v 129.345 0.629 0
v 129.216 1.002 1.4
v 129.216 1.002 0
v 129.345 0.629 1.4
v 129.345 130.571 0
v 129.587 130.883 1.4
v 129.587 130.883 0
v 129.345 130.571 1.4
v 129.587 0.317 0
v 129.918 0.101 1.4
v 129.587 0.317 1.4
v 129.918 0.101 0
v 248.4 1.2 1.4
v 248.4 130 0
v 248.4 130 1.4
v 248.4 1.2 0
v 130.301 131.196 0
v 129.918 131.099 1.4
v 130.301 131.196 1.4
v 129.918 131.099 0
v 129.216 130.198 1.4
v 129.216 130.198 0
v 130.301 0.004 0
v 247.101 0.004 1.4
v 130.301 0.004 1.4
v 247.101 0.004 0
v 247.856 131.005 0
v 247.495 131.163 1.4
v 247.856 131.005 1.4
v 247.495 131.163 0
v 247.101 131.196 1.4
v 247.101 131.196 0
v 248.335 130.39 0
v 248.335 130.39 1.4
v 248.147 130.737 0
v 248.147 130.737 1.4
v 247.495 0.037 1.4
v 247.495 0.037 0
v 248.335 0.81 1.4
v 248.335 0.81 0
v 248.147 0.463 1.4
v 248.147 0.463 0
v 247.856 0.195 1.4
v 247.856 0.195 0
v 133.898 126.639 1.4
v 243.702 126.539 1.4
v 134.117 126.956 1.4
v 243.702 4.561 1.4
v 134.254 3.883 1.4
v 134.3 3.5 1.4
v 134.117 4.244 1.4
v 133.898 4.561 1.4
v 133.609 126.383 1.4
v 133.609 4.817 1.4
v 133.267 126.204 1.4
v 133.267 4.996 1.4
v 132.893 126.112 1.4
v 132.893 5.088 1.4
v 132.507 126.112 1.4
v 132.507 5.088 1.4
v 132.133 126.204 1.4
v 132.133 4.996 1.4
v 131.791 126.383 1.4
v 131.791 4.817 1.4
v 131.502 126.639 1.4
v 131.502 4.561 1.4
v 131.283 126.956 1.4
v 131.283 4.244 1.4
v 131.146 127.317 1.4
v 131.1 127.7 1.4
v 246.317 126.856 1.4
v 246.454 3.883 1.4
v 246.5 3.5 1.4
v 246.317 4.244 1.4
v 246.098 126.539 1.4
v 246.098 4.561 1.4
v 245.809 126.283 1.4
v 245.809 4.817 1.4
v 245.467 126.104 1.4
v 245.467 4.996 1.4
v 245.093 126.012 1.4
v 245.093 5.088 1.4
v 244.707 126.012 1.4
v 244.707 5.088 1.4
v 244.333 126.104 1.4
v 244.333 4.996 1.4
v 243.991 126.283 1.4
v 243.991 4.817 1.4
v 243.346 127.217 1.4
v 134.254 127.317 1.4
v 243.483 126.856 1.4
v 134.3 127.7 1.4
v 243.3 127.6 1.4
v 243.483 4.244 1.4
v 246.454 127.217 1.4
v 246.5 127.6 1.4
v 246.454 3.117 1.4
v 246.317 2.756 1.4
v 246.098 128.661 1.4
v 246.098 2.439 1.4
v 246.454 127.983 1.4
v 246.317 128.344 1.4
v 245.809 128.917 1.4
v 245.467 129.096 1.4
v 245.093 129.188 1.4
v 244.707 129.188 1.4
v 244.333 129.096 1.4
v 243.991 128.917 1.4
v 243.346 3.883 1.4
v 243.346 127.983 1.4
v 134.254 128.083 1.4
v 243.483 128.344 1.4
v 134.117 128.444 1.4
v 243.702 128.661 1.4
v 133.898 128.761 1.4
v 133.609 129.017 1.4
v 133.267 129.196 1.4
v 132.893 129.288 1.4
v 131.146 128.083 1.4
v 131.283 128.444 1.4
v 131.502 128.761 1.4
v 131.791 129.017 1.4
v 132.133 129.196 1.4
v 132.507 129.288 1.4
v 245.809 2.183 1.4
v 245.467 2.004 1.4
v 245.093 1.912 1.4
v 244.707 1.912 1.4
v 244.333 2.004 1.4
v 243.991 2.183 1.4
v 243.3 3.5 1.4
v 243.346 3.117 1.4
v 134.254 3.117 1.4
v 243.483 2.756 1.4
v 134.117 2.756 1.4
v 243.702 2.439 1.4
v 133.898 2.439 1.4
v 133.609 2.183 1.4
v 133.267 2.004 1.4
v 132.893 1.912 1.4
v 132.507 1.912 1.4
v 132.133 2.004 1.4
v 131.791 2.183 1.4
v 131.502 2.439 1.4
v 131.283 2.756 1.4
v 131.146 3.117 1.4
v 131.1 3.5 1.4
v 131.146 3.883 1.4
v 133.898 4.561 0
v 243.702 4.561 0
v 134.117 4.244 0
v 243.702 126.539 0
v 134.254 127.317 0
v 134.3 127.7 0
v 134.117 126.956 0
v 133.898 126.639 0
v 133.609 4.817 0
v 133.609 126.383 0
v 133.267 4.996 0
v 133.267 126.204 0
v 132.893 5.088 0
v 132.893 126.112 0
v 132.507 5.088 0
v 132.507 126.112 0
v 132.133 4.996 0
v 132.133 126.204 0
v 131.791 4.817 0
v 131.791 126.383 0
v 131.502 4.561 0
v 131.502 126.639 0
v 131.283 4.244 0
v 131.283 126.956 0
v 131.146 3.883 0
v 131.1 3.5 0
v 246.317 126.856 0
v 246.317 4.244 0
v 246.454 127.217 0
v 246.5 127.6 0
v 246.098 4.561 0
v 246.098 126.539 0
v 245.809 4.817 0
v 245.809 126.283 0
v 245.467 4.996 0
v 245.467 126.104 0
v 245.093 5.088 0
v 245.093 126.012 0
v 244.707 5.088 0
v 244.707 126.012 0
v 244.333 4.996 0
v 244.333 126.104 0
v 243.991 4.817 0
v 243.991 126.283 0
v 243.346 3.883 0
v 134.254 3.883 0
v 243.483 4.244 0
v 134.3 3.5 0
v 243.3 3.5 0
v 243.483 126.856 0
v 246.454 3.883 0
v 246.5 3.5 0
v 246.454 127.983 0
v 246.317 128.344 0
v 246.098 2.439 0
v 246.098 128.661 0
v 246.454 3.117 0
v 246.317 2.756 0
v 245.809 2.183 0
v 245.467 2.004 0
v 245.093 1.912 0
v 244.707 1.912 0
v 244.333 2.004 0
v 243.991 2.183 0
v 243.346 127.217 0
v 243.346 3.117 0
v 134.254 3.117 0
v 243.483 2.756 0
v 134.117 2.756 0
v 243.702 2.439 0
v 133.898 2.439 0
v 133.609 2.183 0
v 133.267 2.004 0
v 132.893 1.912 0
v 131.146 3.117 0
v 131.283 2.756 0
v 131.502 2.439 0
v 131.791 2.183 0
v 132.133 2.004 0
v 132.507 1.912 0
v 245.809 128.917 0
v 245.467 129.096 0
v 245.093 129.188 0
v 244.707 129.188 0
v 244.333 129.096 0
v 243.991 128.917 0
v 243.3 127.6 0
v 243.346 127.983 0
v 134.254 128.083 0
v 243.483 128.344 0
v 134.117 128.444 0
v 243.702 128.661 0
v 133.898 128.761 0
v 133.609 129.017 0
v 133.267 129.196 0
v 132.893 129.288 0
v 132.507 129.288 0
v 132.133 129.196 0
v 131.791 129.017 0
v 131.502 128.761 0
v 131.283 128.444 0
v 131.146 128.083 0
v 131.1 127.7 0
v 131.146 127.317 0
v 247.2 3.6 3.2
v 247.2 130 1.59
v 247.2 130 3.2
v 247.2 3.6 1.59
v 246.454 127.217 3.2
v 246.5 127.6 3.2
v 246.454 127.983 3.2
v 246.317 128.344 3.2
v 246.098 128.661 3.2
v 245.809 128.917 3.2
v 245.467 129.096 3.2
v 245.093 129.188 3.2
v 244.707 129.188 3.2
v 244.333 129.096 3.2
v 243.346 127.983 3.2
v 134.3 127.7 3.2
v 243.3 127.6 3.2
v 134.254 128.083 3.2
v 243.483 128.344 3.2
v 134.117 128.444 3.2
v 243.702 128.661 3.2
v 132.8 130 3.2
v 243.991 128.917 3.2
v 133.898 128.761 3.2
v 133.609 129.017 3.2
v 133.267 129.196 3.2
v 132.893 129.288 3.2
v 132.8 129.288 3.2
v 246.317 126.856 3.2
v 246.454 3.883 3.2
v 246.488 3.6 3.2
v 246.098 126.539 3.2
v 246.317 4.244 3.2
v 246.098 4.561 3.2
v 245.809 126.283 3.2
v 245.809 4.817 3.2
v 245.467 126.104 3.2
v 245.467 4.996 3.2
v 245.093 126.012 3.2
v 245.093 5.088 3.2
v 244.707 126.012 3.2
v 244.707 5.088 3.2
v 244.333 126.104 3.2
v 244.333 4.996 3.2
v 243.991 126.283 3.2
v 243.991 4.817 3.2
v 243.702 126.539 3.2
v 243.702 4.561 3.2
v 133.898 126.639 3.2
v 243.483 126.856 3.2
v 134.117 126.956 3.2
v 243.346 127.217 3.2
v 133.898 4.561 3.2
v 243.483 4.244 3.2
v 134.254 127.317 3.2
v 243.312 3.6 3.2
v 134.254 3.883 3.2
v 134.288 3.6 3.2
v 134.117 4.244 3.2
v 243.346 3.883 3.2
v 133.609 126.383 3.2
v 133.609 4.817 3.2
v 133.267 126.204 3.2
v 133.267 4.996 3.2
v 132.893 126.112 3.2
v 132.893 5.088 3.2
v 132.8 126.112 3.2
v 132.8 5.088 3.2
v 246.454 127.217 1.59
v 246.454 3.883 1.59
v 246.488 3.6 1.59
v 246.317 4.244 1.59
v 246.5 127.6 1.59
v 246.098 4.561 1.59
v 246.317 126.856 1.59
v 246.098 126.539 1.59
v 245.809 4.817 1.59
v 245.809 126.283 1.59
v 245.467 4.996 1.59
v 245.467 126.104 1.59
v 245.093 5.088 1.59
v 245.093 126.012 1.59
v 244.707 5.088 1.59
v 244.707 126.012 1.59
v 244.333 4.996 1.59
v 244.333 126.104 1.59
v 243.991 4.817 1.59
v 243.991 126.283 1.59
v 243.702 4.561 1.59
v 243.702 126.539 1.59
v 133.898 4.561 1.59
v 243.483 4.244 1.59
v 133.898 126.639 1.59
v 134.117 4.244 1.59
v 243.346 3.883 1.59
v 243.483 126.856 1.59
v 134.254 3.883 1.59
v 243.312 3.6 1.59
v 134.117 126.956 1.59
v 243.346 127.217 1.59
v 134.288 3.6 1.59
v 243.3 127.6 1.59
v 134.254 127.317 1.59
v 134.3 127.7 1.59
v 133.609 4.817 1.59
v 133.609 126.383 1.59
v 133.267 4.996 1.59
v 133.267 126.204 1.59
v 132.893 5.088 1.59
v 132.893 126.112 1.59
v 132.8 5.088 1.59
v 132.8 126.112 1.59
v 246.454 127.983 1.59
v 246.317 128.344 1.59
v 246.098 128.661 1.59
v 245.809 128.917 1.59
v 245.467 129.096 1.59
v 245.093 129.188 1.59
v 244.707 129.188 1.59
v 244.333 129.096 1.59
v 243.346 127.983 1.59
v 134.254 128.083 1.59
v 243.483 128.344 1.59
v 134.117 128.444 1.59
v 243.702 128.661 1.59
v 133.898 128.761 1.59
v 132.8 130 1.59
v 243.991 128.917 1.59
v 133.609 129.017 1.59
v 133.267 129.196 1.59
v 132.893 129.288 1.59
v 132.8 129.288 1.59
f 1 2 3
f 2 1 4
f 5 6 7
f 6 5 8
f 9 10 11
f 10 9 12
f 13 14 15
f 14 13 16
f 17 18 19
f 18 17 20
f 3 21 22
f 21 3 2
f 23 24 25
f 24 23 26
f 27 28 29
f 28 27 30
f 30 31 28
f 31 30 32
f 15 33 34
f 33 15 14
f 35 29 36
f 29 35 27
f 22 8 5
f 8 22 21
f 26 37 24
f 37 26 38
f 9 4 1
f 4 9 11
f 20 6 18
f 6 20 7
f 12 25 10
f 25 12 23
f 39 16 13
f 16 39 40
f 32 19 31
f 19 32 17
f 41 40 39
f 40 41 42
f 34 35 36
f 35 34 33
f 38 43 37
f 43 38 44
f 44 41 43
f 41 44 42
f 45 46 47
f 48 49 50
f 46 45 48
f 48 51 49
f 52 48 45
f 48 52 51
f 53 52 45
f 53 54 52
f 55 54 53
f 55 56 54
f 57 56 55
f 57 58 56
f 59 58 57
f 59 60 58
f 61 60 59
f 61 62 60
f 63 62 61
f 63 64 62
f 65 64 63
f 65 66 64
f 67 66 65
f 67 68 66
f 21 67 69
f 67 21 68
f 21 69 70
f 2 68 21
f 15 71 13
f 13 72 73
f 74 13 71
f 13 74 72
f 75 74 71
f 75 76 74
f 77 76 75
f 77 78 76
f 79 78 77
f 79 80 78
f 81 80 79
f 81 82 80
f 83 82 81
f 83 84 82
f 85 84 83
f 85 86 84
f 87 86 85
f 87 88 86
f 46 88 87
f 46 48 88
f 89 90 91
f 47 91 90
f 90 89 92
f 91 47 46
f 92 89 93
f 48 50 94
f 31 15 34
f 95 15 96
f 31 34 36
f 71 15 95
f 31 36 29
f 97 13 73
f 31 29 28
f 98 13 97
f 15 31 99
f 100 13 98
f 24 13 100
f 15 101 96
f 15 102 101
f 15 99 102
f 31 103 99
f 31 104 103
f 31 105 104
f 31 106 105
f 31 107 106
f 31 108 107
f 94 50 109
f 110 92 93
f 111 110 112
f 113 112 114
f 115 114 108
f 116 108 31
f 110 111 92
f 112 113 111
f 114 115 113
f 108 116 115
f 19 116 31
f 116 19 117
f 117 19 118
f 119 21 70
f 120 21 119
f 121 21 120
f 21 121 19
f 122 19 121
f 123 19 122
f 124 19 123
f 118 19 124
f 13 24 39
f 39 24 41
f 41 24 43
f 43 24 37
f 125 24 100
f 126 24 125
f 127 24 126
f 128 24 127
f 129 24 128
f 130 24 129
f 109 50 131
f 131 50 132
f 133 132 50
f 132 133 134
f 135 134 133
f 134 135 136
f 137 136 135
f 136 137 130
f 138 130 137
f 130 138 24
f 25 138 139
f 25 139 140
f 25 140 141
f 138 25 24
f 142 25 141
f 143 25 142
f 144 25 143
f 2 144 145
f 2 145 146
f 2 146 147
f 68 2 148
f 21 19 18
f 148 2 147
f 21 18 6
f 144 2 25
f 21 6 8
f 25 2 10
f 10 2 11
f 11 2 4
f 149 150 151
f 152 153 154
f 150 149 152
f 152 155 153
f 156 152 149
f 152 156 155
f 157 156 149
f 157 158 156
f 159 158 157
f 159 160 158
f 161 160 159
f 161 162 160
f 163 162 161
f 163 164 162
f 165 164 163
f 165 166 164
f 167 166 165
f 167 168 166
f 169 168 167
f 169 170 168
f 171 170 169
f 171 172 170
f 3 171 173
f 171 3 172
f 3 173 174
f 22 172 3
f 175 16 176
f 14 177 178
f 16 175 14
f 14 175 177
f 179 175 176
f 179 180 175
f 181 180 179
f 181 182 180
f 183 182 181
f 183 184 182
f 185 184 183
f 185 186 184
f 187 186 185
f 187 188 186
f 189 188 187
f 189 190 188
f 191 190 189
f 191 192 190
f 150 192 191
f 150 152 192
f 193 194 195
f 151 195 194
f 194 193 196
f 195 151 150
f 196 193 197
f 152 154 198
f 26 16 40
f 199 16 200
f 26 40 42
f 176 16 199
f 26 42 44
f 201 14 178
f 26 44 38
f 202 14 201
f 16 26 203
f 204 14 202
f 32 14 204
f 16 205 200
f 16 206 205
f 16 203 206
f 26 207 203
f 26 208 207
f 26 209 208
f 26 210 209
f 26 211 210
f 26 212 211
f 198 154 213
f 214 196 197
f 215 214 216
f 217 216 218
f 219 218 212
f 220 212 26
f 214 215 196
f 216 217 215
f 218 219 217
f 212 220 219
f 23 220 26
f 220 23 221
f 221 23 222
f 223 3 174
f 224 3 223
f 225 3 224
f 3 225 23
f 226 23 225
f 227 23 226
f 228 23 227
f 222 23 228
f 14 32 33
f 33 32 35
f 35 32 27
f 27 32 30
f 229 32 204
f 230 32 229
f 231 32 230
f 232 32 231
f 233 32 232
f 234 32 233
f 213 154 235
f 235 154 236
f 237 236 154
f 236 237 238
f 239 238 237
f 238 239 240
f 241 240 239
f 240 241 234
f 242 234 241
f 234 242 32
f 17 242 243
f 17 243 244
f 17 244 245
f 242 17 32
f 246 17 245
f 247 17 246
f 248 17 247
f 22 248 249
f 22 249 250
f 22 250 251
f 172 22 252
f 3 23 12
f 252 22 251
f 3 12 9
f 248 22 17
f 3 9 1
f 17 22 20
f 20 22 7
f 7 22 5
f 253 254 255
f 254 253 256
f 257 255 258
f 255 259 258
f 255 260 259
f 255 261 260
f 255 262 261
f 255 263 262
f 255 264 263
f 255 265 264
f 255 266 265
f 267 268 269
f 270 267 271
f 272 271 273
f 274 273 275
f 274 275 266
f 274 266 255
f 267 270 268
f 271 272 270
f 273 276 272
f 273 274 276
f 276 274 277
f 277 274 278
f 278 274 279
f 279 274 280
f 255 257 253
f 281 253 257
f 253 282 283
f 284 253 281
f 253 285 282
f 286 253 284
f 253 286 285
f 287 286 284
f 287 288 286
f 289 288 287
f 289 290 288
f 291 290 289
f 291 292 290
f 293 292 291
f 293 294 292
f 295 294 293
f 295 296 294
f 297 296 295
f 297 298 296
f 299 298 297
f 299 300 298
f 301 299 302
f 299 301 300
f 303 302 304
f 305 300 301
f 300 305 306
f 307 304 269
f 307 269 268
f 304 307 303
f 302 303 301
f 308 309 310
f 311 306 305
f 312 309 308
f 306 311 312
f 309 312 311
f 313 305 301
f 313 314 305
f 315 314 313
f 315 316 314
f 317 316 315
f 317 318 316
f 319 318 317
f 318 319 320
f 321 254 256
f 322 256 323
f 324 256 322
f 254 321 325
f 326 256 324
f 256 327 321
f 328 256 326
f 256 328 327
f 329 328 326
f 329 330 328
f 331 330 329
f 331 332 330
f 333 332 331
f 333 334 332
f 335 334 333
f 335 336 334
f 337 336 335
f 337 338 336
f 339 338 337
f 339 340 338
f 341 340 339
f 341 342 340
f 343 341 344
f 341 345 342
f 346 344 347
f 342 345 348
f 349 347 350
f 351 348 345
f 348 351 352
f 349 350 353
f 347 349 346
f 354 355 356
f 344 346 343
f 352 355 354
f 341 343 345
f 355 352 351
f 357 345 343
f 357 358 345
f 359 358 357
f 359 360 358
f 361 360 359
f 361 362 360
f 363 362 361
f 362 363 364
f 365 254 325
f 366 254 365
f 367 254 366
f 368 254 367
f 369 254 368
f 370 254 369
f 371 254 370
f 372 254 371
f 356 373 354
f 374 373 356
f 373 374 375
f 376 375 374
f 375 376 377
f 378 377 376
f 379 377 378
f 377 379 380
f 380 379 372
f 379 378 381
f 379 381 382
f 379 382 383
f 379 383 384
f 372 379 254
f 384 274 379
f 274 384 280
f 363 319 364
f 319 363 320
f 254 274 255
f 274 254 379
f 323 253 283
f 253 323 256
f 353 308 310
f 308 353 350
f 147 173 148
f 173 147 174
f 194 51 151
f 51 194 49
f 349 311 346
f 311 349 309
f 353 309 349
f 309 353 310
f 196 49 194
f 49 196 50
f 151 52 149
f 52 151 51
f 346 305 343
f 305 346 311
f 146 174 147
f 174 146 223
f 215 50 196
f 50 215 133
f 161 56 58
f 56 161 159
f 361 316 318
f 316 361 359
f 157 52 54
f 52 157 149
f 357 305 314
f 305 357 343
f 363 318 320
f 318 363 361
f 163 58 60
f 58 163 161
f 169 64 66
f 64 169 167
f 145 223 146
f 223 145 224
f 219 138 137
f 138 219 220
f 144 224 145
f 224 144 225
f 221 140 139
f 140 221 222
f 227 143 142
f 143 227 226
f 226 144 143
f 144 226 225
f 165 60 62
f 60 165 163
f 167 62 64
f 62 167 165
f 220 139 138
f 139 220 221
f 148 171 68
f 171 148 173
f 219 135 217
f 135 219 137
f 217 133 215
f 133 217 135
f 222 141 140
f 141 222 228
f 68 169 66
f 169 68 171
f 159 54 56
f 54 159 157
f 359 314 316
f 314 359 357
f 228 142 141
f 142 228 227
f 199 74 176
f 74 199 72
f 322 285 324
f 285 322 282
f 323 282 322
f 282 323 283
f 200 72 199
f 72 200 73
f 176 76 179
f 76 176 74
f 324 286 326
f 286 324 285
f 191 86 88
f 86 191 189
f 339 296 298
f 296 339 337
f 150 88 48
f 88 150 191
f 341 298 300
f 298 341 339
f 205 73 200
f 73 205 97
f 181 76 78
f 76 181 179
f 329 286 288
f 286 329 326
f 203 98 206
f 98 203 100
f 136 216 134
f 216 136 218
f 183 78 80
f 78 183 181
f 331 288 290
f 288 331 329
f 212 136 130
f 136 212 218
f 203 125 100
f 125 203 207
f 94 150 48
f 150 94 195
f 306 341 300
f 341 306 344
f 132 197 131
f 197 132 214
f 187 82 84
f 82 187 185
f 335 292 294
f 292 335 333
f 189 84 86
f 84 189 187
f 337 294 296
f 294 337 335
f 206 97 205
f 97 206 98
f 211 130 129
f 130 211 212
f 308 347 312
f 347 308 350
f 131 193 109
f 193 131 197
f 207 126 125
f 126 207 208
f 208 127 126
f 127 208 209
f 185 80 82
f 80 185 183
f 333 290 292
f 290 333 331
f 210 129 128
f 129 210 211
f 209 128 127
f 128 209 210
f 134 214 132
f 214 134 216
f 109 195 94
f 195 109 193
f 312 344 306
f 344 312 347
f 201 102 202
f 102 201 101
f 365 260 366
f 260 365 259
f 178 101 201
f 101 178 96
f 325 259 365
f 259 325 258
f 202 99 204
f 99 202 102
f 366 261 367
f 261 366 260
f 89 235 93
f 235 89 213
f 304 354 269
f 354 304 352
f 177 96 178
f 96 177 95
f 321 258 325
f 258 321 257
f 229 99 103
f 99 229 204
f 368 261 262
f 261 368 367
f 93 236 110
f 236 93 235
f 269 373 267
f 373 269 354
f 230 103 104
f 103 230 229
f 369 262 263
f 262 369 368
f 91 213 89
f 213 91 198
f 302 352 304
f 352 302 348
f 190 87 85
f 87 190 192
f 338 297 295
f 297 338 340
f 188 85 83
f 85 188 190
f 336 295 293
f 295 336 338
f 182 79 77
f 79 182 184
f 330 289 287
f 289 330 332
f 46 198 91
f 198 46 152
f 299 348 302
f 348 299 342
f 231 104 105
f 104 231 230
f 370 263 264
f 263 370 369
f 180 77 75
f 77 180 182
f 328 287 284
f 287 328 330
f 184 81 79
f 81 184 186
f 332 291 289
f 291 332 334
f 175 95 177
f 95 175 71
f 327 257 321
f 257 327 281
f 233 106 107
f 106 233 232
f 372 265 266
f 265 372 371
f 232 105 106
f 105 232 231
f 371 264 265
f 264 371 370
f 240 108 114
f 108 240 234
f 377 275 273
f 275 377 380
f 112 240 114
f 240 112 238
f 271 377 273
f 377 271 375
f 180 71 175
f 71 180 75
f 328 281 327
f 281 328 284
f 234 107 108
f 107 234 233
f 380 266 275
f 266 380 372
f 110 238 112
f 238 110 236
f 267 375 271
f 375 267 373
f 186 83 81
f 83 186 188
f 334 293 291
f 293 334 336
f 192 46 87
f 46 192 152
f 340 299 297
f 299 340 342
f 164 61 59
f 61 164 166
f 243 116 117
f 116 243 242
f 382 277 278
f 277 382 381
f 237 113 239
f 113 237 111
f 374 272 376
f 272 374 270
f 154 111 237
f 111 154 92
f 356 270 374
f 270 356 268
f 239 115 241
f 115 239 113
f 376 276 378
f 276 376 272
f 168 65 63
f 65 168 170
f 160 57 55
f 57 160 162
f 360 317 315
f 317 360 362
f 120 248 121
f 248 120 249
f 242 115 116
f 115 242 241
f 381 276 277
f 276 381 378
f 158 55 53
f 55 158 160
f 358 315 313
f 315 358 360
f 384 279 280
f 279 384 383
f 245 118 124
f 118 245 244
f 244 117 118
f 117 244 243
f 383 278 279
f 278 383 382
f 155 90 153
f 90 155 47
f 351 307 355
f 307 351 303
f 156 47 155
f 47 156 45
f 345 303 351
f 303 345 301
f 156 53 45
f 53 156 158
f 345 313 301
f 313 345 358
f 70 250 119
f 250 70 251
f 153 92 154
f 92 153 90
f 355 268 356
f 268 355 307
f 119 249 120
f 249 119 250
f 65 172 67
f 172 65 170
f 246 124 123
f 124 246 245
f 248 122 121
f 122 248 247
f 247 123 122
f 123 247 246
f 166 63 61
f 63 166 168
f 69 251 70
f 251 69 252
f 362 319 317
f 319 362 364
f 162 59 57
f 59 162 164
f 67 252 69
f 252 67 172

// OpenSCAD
// file: libraries/panelmountethernet.scad
// Panel mount Ethernet cutout

$fa=1;
$fs=0.4;

module ethernet_mount() {
    difference() {
        //cube([36,1.6,26]);
        rotate([90,0,0]) translate([0,12,0]) union() {
            cube([16.2,13.6,1.62],center=true); // center hole
            translate([-13.5,-1,-0.81]) cylinder(r=2,h=1.62);
            translate([13.5,-1,-0.81]) cylinder(r=2,h=1.62);
        };
    };
}
//translate([-18,-0.8,0]) cube([36,10,1.6]);
    
// file: libraries/amp_mount.scad
BOARD_X = 18;
BOARD_Y = 22;

BOARD_SOLDER_HEIGHT = 3;
BOARD_THICK = 1.2;

WALL_THICKNESS = 1.6;

TOLERANCE = 1.2;
TOLERANCE_X_ADD = 1;

$fs=0.4;
$fa=1;

// Calculated values
BASE_X = BOARD_X + (WALL_THICKNESS * 2) + TOLERANCE + TOLERANCE_X_ADD;
BASE_Y = BOARD_Y + (WALL_THICKNESS * 2) + TOLERANCE;
BASE_HEIGHT = 4;

module amp_mount_base() {
    // Make the main base        
    cube([BASE_X,BASE_Y,WALL_THICKNESS]);
}

module amp_mount_walls() {
    
    union() {

        // Make X=0 wall
        translate([0,0,WALL_THICKNESS-0.01]) cube([WALL_THICKNESS,BASE_Y,BASE_HEIGHT + TOLERANCE]);
        // Make X=X wall
        translate([BASE_X - WALL_THICKNESS,0,WALL_THICKNESS-0.01]) cube([WALL_THICKNESS,BASE_Y,BASE_HEIGHT + TOLERANCE]);

        // Make Y=0 wall
        translate([0,0,WALL_THICKNESS-0.01]) cube([BASE_X,WALL_THICKNESS,BASE_HEIGHT + TOLERANCE]);
        // Make Y=Y wall
        translate([0,BASE_Y - WALL_THICKNESS,WALL_THICKNESS-0.01]) cube([BASE_X,WALL_THICKNESS,BASE_HEIGHT + TOLERANCE]);
        
    }
}

module amp_mount_surface() {
    // Internal mounting surface for the board. Leaves room for the soldered pins.

    PIN_SPACING = 3; // with some tolerance

    difference() {
        color("green")
            cube([BOARD_X + TOLERANCE + TOLERANCE_X_ADD + 0.02, BOARD_Y + TOLERANCE + 0.02, BOARD_SOLDER_HEIGHT]);

        union() {

            translate([-0.01,-0.01,-0.01]) 
                color("red") 
                cube([PIN_SPACING * 3 + 0.04, PIN_SPACING + 0.02, BOARD_SOLDER_HEIGHT + 0.02]);

            translate([BASE_X - (WALL_THICKNESS * 2) - (PIN_SPACING*2) - 0.01, -0.01, -0.01]) 
                color("red")
                cube([PIN_SPACING * 2 + 0.04, PIN_SPACING + 0.02, BOARD_SOLDER_HEIGHT + 0.02]);
            
            translate([-0.01, BASE_Y - (WALL_THICKNESS * 2) - (PIN_SPACING) - 0.01, -0.01])
                color("red")
                cube([PIN_SPACING * 2 + 0.04, PIN_SPACING + 0.04, BOARD_SOLDER_HEIGHT + 0.02]);

            translate([BASE_X - (WALL_THICKNESS * 2) - (PIN_SPACING*2) - 0.01, BASE_Y - (WALL_THICKNESS * 2) - PIN_SPACING - 0.01, -0.01])
                color("red")
                cube([PIN_SPACING * 2 + 0.04, PIN_SPACING + 0.04, BOARD_SOLDER_HEIGHT + 0.02]);

        }
    }
}

module amp_mount_retention_bump() {

    RADIUS = 1.2;

    difference() {
        rotate([0,270,0])
            difference() {

                color("blue")
                    rotate([270,0,0])
                    cylinder(h=BOARD_Y - 7.4, r=RADIUS);

                translate([0 - RADIUS - 0.01,-0.01,-0.01])
                    cube([RADIUS * 2 + 0.02, BOARD_Y - 5.4 + 0.02, RADIUS + 0.02]);
            }
        
        translate([0 - RADIUS - 0.01, -0.01, -0.01])
                cube([RADIUS * 2 + 0.02, BOARD_Y - 5.4 + 0.02, RADIUS + 0.02]);
    }
}

module amp_mount() {
    amp_mount_base();
    amp_mount_walls();
    translate([WALL_THICKNESS-0.01, WALL_THICKNESS-0.01, WALL_THICKNESS-0.01]) amp_mount_surface();
}

module amp_mount_retention_bumps() {}
    translate([WALL_THICKNESS,WALL_THICKNESS + 4.25, BASE_HEIGHT + BOARD_THICK + 0.4 + WALL_THICKNESS - 0.41])
        amp_mount_retention_bump();
    translate([BASE_X - WALL_THICKNESS,WALL_THICKNESS + 4.25, BASE_HEIGHT + BOARD_THICK + 0.4 + WALL_THICKNESS - 0.41])
        rotate([0,180,0])
        mirror([0,0,1])
        amp_mount_retention_bump();
// file: libraries/screwpost.scad
// generates screw posts 
// by Flint Million
// November 2023

module screwpost(h,r,t,sh)
{
    $fs=0.4;
    // Make a screw post.
    // h = height of entire post
    // r = radius of entire post
    // t = diameter of screw hole
    // sh = depth of screw hole

    difference() {
        // The main cylinder
        cylinder(h,r,r,$fa=360/45);
    
        // The screw hole
        translate([0,0,h - sh]) { cylinder(sh + 0.1,d=t); }
        // 0.1mm addition to translation/length to ensure the
        // hole "penetrates" the skin of the larger cylinder
    }
}
// file: libraries/openbox.scad
// generates an open-top box and lid
// by Flint Million
// November 2023

module openbox(size,ww=1.6,center=false) {

    // Generates a box with an open top.
    
    // size = dimensions of the box (either single value for cube or list for x,y,z)
    // ww = width of walls
    // center = center all axes over origin

    // Set the x, y, and z based on the input
    // if the input is a list, extract the three elements
    // otherwise copy the single element to all three axes (cube)
    x = is_list(size) ? size[0] : size;
    y = is_list(size) ? size[1] : size;
    z = is_list(size) ? size[2] : size;

    // Determine translate factors based on whether center is set or not
    // If center is not set box will sit in the positive quadrant entirely, starting at 0,0,0
    // If center is set box will be centered around the origin on all three axes
    tx = center ? 0 : x/2;
    ty = center ? 0 : y/2;
    tz = center ? -z/2 : 0;
    
    translate([tx,ty,tz]) {
        // Extrude and translate square and hole
         
        linear_extrude(height=z) 
        difference() {
            minkowski() {
                square([x-2.4,y-2.4],center=true);
                circle(r=1.2);
            }
            offset(-ww) square([x,y],center=true);
        }
        
        // Form the bottom of the box
        // Z is 0.01 units higher to avoid touching (not intersecting) walls
        translate([0,0,ww/2]) cube([x,y,ww+0.01],center=true);
    }
}

module openbox_lid(size,ww=1.6,offset=0.4,center=false) {
    // Generates a lid for a box made with openbox.
    
    // size = x and y dimensions of the box (either single value for square or list for x,y)
    // ww = width of walls
    // offset = How much smaller to make the inset (0.4mm is a good size - if it's exactly the same odds are the lid won't fit due to tolerances)
    // center = center all axes over origin

    x = is_list(size) ? size[0] : size;
    y = is_list(size) ? size[1] : size;
    
    tx = center ? -x/2 : 0;
    ty = center ? -y/2 : 0;
    tz = center ? -ww : 0;
    
    translate([tx+1.2,ty+1.2,tz]) {
        // Generate lid
        minkowski() {
            cube([x-2.4,y-2.4,ww-1.2]);
            cylinder(r=1.2,height=1);
        }
        // Generate inner lid
        translate([ww+offset,ww+offset,ww-0.01]) cube([x-(ww*2)-(offset*2),y-(ww*2)-(offset*2),ww+0.01]);
    }
}
// main file
// Amplifier box 
// for The Bone Crusher (Bone Conduction Headset Project)

// design by Flint Million - 11-2023

// History:
//  v3.1 - curve corners of box
//  v3 - switch to panel mount Ethernet jacks
//       enlarge box for easier wire management
//         and to fit ethernet jacks better
//  v2 - fix 3.5mm hole size
//       fix hole spacing for amps
//  v1 - initial test
//       * oops mistyped the size of the 3.5mm jack holes
//         (should have been 6mm, not 8mm)
//       * amp holes too close together

// Note - OpenSCAD (and STL) does not explicitly define the "unit".
// However, the default is to treat one unit in SCAD as one millimeter.
// If you are trying to figure out this model's details, consider that all numbers represent millimeter sizes.

// use some convenience libraries
use <libraries/openbox.scad>
use <libraries/screwpost.scad>
use <libraries/amp_mount.scad>
use <libraries/panelmountethernet.scad>

$fs = 0.4; // 0.4mm minimum feature size for 3d printing

// Static values storing the literal size of the MAX98306 PCB
MX_PCB_X = 28; MX_PCB_Y = 24; MX_PCB_Z = 1.6;

// Sizes of the full MX module including attachments, solder joins etc
MX_X = MX_PCB_X;        // no extensions across board
MX_Y = MX_PCB_Y + 5;    // includes right angle Dupont pins
MX_Z = MX_PCB_Z + 17.4; // includes height of jumper pin + jumper

// Hole sizes
//AVI_HOLE = 16.4;        // spec sheet says 16mm, give 0.4mm for tolerance
PHONE_HOLE = 6.4;       // measured with caliper at 6mm, give 0.4mm for tolerance
DC_HOLE_1 = 12;         // measured with caliper at 11.6mm
DC_HOLE_2 = 10.6;       // measured with caliper at 10.3mm

WALL = 1.6;             // 1.6mm wall thickness

// Box thickness is currently arbitrary but we'll make it 50.8mm (2 inches).
BOX_Z = 60.8;

J_DIST_FROM_TOP = 12;
D_DIST_FROM_BOTTOM = WALL + 8;
//A_DIST_FROM_TOP = 8;
A_DIST_FROM_TOP = 28;
L_DIST_FROM_BOTTOM = WALL + 11;

// The size (x,y) of the box will be:
//   * two walls
//   * two amps
//   * 10mm clearance between each amp and edge in x axis (3 clearances)
//   * 20mm clearance between each amp in y axis
//   * extra 10mm clearance in the front and back for cabling, screw posts...

BOX_X = (WALL * 2) + (MX_X * 2) + 60;
BOX_Y = (WALL * 2) + (MX_Y * 2) + 70;

module amp_mainbox() {
    
    // Generate the box and remove the mounting holes for the connectors
    difference() {

        // Main box frame
        color("#f7e400") openbox([BOX_X,BOX_Y,BOX_Z]);

        // Four holes for the 3.5mm jacks
        // To compute the formula for jack positioning we will determine the *center point* for each jack.
        // To do this we simply take the available width and divide it by one more than the number of jacks.
        // This gives us the distance between center points for each of the four jacks.
        // Then we can figure out the left point per jack by subtracting the radius from each center point.

        C_DIST = BOX_X / 5;

        for (J = [1 : 4]) {
            color("green") translate([C_DIST * J, 0, BOX_Z - J_DIST_FROM_TOP - PHONE_HOLE])
                // moving UPWARDS from cylinder, at this point the cylinder's center point is at 0,0,0 and it's rotated vertically.
                translate([0,WALL*2,PHONE_HOLE / 2])
                rotate([90,0,0])
                cylinder(h=WALL*3,r=PHONE_HOLE / 2);
        }

        // One hole for the barrel power jack with straightened sides for keying
        // Center the hole along the x axis.
        color("red") translate([BOX_X / 2,-WALL,D_DIST_FROM_BOTTOM]) amp_dc_hole();

        // Two panel mount ethernet mount points
        A_DIST = BOX_X / 3;
        for (J = [1 : 2]) {
            color("cyan") translate([A_DIST * J + (J == 2 ? 6 : -6) + WALL, BOX_Y - WALL, BOX_Z - A_DIST_FROM_TOP])
                scale([1,3,1])
                ethernet_mount();
        }

        // // Two holes for the aviation jacks
        // A_DIST = BOX_X / 3;

        // for (J = [1 : 2]) {
        //     color("cyan") translate([A_DIST * J + WALL, BOX_Y - WALL, BOX_Z - A_DIST_FROM_TOP - AVI_HOLE])
        //         // moving UPWARDS from cylinder, at this point the cylinder's center point is at 0,0,0 and it's rotated vertically.
        //         translate([0,WALL*2,AVI_HOLE / 2])
        //         rotate([90,0,0])
        //         cylinder(h=WALL*3,r=AVI_HOLE / 2);
        // }

        // a 5mm hole for a power LED
        // slightly undersized for a snug fit (v2)
        // Put the hole directly below the rightmost 3.5mm jack
        color("red") translate([C_DIST * 4, 0, L_DIST_FROM_BOTTOM])
            translate([0,WALL*2+0.1,2.6])
            rotate([90,0,0])
            cylinder(h=WALL*3,r=2.4);

        // a 5mm hole for a power switch
        // Put the hole directly below the leftmost 3.5mm jack
        color("red") translate([C_DIST * 1, 0, L_DIST_FROM_BOTTOM])
            translate([0,WALL*2,2.5])
            rotate([90,0,0])
            cylinder(h=WALL*3,r=2.5);

    }
    
    // Add lid screw posts
    SP_DIST=0.5; // 0.5mm from edges of box
    translate([3+SP_DIST,3+SP_DIST,WALL-0.01]) screwpost(h=BOX_Z - WALL - 2, r=3, t=2, sh=10);
    translate([BOX_X - (3+SP_DIST),3+SP_DIST,WALL-0.01]) screwpost(h=BOX_Z - WALL - 2, r=3, t=2, sh=10);
    translate([BOX_X - (3+SP_DIST), BOX_Y - (3+SP_DIST),WALL-0.01]) screwpost(h=BOX_Z - WALL - 2, r=3, t=2, sh=10);
    translate([3+SP_DIST,BOX_Y - (3+SP_DIST),WALL-0.01]) screwpost(h=BOX_Z - WALL - 2, r=3, t=2, sh=10);

    // Each amplifier needs two little screw posts.
    // Amps are mounted with Duponts facing *forward* so we measure from the back.
    // Example: first amp PCB edge is 10mm from both left and back wall,
    // and screw post is 1.2mm in from edge.
    // Screw hole diameter is 2mm, post diamater is 6mm
    // So the screw hole left and top position must be 3mm from the screw hole
    // Math: Since screw hole is 1.2mm in on both axes, screw post edge is simply 1.8mm from corner of PCB.

    // V2 - NO MORE AMP SCREW POSTS, Instead we do ampbox mounts.
    // for (AMP = [0 : 3]) {
    //     X_ADD = (AMP % 2 == 1); // if amp % 2 is not 0, shift on X axis
    //     Y_ADD = (floor(AMP / 2) == 1); // if amp / 2 > 0, shift on Y axis

    //     // for amp 0
    //     AMP_CORNER_X = WALL + 10 - 3.0;
    //     AMP_CORNER_Y = BOX_Y - WALL - 25 + 1.8;

    //     // if add x, shift over by one amp + 10mm gap
    //     AMP_CORNER_X2 = X_ADD ? AMP_CORNER_X + MX_X + 20 : AMP_CORNER_X;
    //     // same for y
    //     AMP_CORNER_Y2 = Y_ADD ? AMP_CORNER_Y - MX_Y - 20 : AMP_CORNER_Y;

    //     color("#480059") translate([AMP_CORNER_X2, AMP_CORNER_Y2, WALL]) screwpost(h=6,r=3,t=2,sh=6);
    //     color("#480059") translate([AMP_CORNER_X2 + (MX_PCB_X - 4.8), AMP_CORNER_Y2, WALL]) screwpost(h=6,r=3,t=2,sh=6);

    // }

    // The amp mount plates are 23.4mm (x) by 26.4mm (y)
    AMP_PLATE_X = 23.4;
    AMP_PLATE_Y = 26.4;

    for (AMP = [0 : 3]) {
        X_ADD = (AMP % 2 == 1); // if amp % 2 is not 0, shift on X axis
        Y_ADD = (floor(AMP / 2) == 1); // if amp / 2 > 0, shift on Y axis

        // for amp 0
        AMP_CORNER_X = WALL + 25 - 3.0;
        AMP_CORNER_Y = BOX_Y - WALL - 40 + 1.8;

        // if add x, shift over by one amp + 10mm gap
        AMP_CORNER_X2 = X_ADD ? AMP_CORNER_X + AMP_PLATE_X + 30 : AMP_CORNER_X;
        // same for y
        AMP_CORNER_Y2 = Y_ADD ? AMP_CORNER_Y - AMP_PLATE_Y - 30 : AMP_CORNER_Y;

        color("#480059") translate([AMP_CORNER_X2, AMP_CORNER_Y2, WALL - 0.01]) amp_mount();

    }
}

module amp_dc_hole() {

    // this is a bit convoluted but it'll subtract the two sides from the circle
    CUTOUT_OUTER = DC_HOLE_1 + 10;

    difference() {
        // first we form the hole
        translate([0,WALL*3,DC_HOLE_1 / 2])
        rotate([90,0,0])
        cylinder(h=WALL*3,r=DC_HOLE_1 / 2);

        difference() {
            color("blue") translate([-(CUTOUT_OUTER/2),-WALL-0.1,-5])
                cube([CUTOUT_OUTER,WALL*3+0.2,CUTOUT_OUTER]);        
            color("cyan") translate([-(DC_HOLE_2/2),-WALL-0.1,-5])
                cube([DC_HOLE_2,WALL*3+0.2,CUTOUT_OUTER]);
        }
    }
}

module amp_lid() {

    difference() {
        // Make lid first
        openbox_lid([BOX_X,BOX_Y],offset=WALL/2);
        // Remove screw holes
        color("blue") translate([WALL+2-0.1,WALL+2-0.1,-0.01]) cylinder(r=1.6,h=WALL*2+0.02);
        color("blue") translate([BOX_X - (WALL+2-0.1),WALL+2-0.1,-0.01]) cylinder(r=1.6,h=WALL*2+0.02);
        color("blue") translate([BOX_X - (WALL+2-0.1),BOX_Y - (WALL+2),-0.01]) cylinder(r=1.6,h=WALL*2+0.02);
        color("blue") translate([WALL+2-0.1,BOX_Y - (WALL+2-0.1),-0.01]) cylinder(r=1.6,h=WALL*2+0.02);
    }
}
//amp_mainbox();
color("#480059") translate([BOX_X+10,0,0]) amp_lid();
